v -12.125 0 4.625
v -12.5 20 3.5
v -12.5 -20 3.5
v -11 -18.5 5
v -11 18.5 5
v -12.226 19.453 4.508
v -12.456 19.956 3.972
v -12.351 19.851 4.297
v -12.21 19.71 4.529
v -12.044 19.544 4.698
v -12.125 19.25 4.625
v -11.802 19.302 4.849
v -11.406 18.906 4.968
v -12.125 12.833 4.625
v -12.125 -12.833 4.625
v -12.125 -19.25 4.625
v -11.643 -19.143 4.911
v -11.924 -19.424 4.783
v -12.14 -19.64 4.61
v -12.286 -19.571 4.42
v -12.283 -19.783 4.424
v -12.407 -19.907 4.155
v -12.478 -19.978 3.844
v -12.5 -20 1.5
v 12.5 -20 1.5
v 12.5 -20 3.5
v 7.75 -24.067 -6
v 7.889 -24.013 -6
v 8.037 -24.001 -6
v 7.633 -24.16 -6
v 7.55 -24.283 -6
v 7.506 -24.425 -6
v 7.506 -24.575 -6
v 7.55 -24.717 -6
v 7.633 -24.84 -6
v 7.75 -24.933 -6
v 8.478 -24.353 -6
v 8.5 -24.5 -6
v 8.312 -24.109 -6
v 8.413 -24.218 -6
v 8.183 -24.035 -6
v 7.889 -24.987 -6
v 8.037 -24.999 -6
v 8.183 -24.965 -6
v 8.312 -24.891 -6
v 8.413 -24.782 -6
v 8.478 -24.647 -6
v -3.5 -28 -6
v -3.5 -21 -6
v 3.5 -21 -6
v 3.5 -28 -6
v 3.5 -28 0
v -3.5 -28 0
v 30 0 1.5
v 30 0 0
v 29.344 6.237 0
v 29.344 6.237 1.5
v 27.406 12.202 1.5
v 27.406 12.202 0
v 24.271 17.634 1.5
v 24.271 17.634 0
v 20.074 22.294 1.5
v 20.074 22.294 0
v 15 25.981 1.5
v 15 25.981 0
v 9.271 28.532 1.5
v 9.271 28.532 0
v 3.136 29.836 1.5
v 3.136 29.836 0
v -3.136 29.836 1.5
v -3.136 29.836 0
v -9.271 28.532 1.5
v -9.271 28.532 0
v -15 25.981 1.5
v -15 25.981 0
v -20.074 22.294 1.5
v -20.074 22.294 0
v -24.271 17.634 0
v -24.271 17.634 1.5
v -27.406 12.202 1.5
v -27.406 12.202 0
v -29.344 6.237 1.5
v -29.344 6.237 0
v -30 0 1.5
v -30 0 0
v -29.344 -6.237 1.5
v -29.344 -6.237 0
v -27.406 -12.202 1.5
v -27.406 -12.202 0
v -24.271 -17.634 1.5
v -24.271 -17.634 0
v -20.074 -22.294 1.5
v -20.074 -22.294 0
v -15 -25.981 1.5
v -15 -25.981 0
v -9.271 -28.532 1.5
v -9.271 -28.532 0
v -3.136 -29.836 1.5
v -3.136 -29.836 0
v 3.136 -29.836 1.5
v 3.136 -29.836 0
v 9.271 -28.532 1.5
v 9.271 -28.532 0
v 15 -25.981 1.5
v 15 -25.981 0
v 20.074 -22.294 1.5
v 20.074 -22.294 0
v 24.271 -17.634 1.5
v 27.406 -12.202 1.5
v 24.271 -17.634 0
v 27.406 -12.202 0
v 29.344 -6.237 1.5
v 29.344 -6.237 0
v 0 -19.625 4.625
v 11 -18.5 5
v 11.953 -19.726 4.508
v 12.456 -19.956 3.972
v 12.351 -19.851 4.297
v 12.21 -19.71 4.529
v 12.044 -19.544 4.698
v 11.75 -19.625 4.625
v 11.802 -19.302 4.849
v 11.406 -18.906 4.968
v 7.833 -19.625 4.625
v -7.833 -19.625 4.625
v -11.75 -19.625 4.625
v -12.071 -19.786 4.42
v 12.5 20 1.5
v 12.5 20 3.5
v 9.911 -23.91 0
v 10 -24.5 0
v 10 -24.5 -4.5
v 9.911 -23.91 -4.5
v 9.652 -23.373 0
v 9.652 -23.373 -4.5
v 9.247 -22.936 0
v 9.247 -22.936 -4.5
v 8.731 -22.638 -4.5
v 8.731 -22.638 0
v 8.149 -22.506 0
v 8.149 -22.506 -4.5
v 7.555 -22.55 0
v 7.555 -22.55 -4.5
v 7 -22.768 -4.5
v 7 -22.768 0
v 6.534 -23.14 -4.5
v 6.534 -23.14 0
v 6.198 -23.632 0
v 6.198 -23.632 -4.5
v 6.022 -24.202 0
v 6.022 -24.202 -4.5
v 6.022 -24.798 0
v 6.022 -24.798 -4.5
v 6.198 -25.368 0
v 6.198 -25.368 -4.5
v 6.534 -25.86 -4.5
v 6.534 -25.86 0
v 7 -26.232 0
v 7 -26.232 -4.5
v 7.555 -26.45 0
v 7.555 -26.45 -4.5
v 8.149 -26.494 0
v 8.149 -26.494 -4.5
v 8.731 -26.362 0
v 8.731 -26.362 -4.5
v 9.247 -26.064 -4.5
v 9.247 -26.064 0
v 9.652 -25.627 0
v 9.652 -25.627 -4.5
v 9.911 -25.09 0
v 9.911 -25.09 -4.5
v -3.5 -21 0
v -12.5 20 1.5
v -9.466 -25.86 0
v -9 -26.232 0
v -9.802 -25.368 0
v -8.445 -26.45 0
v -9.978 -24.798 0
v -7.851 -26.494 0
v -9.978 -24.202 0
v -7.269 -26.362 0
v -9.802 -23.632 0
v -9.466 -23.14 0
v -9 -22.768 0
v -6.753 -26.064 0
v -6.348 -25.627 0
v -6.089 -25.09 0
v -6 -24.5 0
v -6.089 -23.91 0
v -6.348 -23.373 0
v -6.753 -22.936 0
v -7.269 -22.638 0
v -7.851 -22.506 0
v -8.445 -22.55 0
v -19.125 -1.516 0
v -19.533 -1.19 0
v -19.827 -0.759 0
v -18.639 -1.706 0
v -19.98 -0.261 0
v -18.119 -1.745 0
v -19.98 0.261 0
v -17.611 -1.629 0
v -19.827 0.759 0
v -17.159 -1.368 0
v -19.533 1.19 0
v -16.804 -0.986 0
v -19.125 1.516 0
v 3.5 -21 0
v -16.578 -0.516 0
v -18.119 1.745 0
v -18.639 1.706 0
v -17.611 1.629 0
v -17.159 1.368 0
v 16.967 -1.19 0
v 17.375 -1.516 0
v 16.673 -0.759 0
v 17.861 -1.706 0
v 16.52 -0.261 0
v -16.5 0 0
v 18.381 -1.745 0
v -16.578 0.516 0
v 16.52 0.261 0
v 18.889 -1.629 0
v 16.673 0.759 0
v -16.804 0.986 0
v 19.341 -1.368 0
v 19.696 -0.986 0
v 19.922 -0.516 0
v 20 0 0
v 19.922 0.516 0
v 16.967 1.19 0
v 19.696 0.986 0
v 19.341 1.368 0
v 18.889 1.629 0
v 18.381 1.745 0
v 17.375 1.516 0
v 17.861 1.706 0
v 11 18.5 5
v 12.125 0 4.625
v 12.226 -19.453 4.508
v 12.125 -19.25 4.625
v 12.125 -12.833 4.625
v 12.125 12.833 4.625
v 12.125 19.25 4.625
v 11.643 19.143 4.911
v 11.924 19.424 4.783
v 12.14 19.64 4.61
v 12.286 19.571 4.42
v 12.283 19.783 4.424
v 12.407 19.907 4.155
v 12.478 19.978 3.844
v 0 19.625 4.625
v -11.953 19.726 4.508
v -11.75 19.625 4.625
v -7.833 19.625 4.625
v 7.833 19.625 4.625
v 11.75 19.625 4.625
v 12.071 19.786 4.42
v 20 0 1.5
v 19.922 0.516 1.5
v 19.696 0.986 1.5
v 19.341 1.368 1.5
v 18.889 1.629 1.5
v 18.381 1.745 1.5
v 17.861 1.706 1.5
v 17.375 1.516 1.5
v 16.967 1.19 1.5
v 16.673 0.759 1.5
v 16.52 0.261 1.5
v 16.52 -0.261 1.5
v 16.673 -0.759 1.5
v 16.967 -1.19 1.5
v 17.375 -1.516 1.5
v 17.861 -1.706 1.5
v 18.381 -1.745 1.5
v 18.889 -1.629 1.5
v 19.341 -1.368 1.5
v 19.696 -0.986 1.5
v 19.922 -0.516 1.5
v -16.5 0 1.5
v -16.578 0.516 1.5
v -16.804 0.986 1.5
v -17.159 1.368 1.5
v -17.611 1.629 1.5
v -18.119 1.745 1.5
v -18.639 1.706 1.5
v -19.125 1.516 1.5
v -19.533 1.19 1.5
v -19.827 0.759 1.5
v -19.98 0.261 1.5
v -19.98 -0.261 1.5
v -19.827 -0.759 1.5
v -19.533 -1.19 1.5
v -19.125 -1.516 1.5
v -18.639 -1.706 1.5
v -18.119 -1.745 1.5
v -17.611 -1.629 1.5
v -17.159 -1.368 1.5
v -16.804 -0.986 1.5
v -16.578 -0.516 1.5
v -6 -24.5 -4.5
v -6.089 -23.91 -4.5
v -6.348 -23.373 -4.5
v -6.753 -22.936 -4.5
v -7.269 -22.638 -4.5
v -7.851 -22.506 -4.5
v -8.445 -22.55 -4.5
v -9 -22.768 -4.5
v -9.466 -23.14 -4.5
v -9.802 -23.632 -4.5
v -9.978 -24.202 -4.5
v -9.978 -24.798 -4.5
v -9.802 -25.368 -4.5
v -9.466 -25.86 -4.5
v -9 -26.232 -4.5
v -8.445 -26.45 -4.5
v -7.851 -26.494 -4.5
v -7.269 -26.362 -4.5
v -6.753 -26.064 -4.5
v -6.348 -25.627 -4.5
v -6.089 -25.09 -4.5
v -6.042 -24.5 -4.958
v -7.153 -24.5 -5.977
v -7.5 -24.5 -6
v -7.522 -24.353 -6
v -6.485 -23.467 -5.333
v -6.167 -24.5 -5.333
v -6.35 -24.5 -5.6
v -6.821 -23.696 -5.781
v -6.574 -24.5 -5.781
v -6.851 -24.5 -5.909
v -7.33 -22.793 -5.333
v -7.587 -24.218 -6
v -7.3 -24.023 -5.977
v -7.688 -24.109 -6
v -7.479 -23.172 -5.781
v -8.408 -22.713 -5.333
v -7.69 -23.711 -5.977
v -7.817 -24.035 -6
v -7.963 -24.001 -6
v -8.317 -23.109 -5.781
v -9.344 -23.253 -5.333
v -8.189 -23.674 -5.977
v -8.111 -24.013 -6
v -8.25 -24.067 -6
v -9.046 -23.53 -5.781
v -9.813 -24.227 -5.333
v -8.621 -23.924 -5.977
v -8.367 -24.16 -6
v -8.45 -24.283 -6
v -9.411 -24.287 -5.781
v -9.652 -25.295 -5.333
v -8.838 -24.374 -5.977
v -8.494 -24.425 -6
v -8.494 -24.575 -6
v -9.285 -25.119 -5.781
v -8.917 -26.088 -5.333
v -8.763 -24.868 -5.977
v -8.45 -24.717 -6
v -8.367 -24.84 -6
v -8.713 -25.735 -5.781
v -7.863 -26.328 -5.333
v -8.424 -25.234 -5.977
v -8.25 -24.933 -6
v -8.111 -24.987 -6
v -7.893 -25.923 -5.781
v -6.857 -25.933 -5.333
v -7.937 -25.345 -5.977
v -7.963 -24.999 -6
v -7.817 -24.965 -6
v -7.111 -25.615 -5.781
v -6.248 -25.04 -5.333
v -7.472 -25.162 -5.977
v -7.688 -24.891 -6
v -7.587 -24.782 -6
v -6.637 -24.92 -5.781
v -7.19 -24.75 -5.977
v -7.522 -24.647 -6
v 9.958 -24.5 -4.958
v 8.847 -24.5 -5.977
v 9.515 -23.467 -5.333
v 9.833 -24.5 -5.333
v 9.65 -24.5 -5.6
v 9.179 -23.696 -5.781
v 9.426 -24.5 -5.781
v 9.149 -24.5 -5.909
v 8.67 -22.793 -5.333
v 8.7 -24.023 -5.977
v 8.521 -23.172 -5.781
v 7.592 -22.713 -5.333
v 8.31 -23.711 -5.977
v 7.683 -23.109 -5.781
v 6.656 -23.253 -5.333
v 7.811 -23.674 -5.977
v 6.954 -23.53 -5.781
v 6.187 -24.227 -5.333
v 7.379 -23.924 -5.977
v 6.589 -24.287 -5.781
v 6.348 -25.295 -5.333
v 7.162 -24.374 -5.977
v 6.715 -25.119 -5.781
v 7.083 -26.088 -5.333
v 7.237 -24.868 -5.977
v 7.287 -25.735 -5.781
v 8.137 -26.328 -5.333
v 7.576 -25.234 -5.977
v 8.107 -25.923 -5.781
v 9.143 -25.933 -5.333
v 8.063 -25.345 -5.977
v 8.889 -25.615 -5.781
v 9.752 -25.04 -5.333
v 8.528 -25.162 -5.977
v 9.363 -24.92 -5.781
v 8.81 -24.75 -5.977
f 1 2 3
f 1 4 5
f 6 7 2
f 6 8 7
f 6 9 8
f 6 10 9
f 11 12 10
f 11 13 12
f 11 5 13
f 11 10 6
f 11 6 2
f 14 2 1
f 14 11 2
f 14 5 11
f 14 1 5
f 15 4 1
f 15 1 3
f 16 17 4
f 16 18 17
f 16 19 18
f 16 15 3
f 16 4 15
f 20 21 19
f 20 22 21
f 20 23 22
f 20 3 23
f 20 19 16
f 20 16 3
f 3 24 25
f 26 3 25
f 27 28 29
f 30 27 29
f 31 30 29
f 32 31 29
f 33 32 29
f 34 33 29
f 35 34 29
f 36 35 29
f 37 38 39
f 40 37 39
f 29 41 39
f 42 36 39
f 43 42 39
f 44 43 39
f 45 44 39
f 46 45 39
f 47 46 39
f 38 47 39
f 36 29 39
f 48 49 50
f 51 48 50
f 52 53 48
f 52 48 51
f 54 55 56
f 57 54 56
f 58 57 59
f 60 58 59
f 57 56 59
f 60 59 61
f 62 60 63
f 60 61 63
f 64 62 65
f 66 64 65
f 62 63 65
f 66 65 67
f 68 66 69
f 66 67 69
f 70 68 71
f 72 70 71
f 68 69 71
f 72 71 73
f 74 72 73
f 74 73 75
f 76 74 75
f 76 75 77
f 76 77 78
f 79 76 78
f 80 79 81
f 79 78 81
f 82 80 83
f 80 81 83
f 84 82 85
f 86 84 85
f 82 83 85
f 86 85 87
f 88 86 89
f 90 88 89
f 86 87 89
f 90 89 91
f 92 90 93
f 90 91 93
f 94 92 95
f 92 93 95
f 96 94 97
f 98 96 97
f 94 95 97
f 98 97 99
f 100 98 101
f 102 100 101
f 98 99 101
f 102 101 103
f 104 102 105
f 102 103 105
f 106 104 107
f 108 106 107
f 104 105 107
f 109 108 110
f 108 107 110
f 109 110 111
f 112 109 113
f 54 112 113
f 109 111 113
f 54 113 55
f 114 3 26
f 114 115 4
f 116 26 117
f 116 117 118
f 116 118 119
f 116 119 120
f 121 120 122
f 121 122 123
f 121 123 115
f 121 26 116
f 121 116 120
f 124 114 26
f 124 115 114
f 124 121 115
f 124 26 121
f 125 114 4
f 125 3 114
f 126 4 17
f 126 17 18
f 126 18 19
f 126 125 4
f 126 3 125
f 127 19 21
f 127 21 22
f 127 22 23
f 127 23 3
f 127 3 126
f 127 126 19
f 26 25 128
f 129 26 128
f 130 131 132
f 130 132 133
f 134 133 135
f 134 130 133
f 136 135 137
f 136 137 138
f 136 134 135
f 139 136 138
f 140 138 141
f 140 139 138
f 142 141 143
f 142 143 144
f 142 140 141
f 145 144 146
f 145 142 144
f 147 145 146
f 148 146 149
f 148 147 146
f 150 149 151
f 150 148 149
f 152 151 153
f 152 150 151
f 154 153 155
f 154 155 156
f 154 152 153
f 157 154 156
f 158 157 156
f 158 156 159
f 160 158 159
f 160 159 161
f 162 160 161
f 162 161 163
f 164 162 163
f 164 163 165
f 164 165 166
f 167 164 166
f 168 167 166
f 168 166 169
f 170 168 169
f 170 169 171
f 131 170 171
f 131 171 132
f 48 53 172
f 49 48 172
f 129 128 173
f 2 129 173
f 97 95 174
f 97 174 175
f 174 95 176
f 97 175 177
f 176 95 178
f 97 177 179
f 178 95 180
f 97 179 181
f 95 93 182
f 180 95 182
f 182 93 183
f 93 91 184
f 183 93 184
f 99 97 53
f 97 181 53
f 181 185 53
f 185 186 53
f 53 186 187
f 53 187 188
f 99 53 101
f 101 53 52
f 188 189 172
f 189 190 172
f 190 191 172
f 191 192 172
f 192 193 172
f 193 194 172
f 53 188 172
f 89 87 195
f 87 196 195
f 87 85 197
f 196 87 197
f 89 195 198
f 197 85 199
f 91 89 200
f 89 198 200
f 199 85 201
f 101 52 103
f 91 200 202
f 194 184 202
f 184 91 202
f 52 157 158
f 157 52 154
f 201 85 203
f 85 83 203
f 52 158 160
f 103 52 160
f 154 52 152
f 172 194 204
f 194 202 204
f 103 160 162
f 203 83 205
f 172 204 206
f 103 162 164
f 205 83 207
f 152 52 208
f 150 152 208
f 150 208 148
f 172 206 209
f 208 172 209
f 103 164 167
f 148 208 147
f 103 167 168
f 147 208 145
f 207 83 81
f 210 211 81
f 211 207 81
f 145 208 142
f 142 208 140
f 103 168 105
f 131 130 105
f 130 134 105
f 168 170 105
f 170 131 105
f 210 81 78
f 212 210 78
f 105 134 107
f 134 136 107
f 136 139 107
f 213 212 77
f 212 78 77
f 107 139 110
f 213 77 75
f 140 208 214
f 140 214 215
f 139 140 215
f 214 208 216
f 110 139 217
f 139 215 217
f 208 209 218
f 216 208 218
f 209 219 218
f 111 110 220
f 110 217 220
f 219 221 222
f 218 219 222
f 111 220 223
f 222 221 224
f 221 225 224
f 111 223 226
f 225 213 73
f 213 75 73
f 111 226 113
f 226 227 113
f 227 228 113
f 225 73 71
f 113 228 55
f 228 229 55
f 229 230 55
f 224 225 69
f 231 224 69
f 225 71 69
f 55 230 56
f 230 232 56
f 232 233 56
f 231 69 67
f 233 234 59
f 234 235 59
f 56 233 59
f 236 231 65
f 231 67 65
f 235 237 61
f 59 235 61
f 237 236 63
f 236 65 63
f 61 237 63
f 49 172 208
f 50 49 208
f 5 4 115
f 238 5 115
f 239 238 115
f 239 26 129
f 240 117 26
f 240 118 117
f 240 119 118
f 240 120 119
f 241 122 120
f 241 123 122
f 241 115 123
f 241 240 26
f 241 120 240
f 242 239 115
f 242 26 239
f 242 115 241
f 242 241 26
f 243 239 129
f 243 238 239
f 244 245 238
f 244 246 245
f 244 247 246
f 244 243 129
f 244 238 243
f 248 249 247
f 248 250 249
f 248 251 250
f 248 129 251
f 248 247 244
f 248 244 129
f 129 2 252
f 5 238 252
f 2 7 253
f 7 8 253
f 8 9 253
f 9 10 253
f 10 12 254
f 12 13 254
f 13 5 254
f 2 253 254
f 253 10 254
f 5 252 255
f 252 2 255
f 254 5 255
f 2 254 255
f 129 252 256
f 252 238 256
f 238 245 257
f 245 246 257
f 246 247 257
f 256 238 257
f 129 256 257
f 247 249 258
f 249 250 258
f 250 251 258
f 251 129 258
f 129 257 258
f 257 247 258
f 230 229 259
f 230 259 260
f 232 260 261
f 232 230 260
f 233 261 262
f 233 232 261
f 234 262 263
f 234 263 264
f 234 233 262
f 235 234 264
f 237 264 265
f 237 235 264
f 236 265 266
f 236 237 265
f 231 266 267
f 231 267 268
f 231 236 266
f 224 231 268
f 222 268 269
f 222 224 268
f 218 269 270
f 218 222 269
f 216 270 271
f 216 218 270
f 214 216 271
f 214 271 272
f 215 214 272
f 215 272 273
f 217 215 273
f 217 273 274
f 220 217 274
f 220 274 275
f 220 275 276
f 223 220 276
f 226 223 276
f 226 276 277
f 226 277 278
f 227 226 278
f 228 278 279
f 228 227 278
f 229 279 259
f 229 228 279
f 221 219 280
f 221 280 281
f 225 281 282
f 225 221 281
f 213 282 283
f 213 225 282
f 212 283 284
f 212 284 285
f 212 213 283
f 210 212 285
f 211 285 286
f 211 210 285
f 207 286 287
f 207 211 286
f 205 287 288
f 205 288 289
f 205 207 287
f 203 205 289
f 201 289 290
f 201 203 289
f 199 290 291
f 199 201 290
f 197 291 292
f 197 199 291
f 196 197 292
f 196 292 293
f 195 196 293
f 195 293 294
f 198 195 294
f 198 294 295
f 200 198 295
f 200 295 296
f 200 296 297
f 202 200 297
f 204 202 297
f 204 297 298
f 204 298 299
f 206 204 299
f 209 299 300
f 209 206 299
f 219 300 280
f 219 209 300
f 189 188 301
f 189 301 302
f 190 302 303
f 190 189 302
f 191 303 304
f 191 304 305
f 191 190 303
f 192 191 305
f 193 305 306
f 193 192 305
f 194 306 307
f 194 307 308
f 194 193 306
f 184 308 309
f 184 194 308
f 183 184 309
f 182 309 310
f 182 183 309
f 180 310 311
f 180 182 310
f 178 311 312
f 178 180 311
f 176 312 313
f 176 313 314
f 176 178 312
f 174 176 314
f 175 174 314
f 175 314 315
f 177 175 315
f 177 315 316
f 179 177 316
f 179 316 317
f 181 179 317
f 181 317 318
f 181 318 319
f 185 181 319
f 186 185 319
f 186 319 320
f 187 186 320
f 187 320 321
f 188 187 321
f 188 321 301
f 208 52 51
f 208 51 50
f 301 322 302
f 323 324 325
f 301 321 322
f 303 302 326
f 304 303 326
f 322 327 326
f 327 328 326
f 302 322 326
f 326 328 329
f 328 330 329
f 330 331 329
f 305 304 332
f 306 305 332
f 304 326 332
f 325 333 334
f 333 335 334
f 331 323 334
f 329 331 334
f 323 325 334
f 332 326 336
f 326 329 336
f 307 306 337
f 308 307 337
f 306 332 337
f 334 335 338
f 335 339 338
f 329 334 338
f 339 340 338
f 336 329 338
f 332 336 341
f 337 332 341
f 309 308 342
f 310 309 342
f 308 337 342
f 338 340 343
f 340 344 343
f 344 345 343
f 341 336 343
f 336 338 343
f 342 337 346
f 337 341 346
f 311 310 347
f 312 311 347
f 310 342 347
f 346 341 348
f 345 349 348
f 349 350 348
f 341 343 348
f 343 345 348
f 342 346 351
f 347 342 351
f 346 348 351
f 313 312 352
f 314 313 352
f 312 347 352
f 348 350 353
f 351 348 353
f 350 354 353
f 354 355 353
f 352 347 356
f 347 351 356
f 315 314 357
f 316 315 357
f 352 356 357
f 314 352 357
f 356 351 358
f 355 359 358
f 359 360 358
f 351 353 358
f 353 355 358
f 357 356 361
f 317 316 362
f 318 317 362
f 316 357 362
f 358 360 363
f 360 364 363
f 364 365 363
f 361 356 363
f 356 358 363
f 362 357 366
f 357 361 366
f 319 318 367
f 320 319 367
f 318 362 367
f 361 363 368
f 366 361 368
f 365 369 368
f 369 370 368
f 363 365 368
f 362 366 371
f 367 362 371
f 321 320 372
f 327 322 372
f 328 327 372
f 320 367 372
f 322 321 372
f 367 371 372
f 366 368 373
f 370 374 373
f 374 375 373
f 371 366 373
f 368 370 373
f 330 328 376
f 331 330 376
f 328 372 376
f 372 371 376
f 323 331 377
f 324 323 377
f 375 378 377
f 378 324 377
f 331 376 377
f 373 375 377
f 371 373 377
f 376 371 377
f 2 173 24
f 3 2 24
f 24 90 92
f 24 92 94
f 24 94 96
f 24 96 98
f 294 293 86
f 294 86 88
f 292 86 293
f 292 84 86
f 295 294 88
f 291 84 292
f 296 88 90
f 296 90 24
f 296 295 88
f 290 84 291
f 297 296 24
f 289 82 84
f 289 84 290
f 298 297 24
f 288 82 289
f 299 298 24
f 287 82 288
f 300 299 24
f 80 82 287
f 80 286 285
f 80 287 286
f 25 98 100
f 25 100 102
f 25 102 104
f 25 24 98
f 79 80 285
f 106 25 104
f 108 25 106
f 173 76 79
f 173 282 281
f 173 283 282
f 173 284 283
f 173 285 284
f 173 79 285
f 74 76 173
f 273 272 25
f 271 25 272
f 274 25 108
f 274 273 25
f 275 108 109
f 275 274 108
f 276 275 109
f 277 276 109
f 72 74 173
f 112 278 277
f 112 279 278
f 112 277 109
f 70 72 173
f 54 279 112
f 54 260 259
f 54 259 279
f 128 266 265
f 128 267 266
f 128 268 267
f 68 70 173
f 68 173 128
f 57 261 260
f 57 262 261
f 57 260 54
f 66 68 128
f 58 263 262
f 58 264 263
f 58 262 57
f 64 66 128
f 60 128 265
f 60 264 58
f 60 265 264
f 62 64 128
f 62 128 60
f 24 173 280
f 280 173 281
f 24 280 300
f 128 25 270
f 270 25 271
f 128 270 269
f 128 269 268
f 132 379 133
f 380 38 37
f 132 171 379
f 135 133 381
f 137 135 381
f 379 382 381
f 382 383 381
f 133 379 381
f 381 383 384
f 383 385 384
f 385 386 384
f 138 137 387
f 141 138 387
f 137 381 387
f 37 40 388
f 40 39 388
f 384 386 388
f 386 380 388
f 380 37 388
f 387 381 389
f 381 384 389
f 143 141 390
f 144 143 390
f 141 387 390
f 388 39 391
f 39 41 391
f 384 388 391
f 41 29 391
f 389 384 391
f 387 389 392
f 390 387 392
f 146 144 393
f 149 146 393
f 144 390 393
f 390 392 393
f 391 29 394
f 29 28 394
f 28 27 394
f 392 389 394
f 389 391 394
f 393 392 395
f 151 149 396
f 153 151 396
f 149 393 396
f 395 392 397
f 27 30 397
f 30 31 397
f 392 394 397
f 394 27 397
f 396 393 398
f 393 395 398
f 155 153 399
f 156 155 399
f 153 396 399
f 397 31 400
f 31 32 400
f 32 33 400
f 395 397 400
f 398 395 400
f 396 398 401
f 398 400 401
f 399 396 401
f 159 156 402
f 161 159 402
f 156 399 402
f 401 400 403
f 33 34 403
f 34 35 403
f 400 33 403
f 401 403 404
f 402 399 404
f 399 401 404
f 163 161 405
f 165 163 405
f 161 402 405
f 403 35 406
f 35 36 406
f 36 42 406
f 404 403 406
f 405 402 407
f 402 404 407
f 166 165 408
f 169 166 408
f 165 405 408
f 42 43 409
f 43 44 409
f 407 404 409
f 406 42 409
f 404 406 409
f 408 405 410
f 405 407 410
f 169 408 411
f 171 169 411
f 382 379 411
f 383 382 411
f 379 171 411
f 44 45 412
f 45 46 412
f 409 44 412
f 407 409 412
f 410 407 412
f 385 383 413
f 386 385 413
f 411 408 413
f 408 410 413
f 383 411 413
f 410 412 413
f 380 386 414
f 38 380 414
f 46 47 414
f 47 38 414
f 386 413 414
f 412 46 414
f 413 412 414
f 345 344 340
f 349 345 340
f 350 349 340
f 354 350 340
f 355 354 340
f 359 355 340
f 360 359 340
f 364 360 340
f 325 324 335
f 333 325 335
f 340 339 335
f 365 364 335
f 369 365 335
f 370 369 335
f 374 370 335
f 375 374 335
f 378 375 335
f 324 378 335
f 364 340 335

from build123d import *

# Parameters (mm, degrees)
SKETCH_1_R      = 30
SKETCH_1_R_2    = 1.75
SKETCH_1_W      = 25
SKETCH_1_H      = 40
EXTRUDE_6_DEPTH = 1.5
EXTRUDE_7_DEPTH = 5
SKETCH_1_10_R   = 2
SKETCH_1_10_W   = 7
SKETCH_1_10_H   = 7
EXTRUDE_8_DEPTH = 6
FILLET_3_SIZE   = 1.5
FILLET_4_SIZE   = 1.5
EXTRUDE_9_DEPTH = 5
FILLET_5_SIZE   = 1.5


with BuildPart() as part:
    # 草图1 → 凸台-拉伸6 (new body)
    with BuildSketch(Plane.XY):
        Circle(SKETCH_1_R)
        with Locations((18.25, 0)):
            Circle(SKETCH_1_R_2, mode=Mode.SUBTRACT)
        with Locations((-18.25, 0)):
            Circle(SKETCH_1_R_2, mode=Mode.SUBTRACT)
        Rectangle(SKETCH_1_W, SKETCH_1_H, mode=Mode.SUBTRACT)
    extrude(amount=EXTRUDE_6_DEPTH)

    # 草图1<9> → 凸台-拉伸7 (add)
    with BuildSketch(Plane.XY):
        Polygon((-12.5, 20), (-12.5, 0), (0, 0), (12.5, 0), (12.5, 20), align=None)
    extrude(amount=EXTRUDE_7_DEPTH)

    # 草图1<10> → 凸台-拉伸8 (add)
    with BuildSketch(Plane.XY):
        with Locations((8, -24.5)):
            Circle(SKETCH_1_10_R)
        with Locations((0, -24.5)):
            Rectangle(SKETCH_1_10_W, SKETCH_1_10_H)
        with Locations((-8, -24.5)):
            Circle(SKETCH_1_10_R)
    extrude(amount=-EXTRUDE_8_DEPTH)

    # 圆角3
    # a fillet whose section is not a circle: 1.5 mm, written as the material it takes off along each edge
    with BuildSketch(Plane(origin=(8, -24.5, -6), x_dir=(1, 0, 0), z_dir=(0, -1, 0))) as fillet_3_piece_1:
        with BuildLine():
            Bezier((2, FILLET_3_SIZE), (2, 0), (2 - FILLET_3_SIZE, 0), weights=[1, 1, 1])
            Line((2 - FILLET_3_SIZE, 0), (2, 0))
            Line((2, 0), (2, FILLET_3_SIZE))
        make_face()
    revolve(axis=Axis((8, -24.5, -6), (0, 0, 1)), mode=Mode.SUBTRACT)

    # 圆角4
    # a fillet whose section is not a circle: 1.5 mm, written as the material it takes off along each edge
    with BuildSketch(Plane(origin=(-8, -24.5, -6), x_dir=(1, 0, 0), z_dir=(0, -1, 0))) as fillet_4_piece_1:
        with BuildLine():
            Bezier((2, FILLET_4_SIZE), (2, 0), (2 - FILLET_4_SIZE, 0), weights=[1, 1, 1])
            Line((2 - FILLET_4_SIZE, 0), (2, 0))
            Line((2, 0), (2, FILLET_4_SIZE))
        make_face()
    revolve(axis=Axis((-8, -24.5, -6), (0, 0, 1)), mode=Mode.SUBTRACT)

    # 草图1<11> → 凸台-拉伸9 (add)
    with BuildSketch(Plane.XY):
        Polygon((-12.5, 0), (-12.5, -20), (12.5, -20), (12.5, 0), (0, 0), align=None)
    extrude(amount=EXTRUDE_9_DEPTH)

    # 圆角5
    # a fillet whose section is not a circle: 1.5 mm, written as the material it takes off along each edge
    with BuildSketch(Plane(origin=(16.25, 20, 5), x_dir=(0, -1, 0), z_dir=(-1, 0, 0))) as fillet_5_piece_1:
        with BuildLine():
            Bezier((FILLET_5_SIZE, 0), (0, 0), (0, -FILLET_5_SIZE), weights=[1, 1, 1])
            Line((0, -FILLET_5_SIZE), (0, 0))
            Line((0, 0), (FILLET_5_SIZE, 0))
        make_face()
    extrude(amount=32.5, mode=Mode.SUBTRACT)
    with BuildSketch(Plane(origin=(12.5, 23.75, 5), x_dir=(-1, 0, 0), z_dir=(0, -1, 0)), Plane(origin=(-12.5, -23.75, 5), x_dir=(1, 0, 0), z_dir=(0, 1, 0))) as fillet_5_piece_2:
        with BuildLine():
            Bezier((FILLET_5_SIZE, 0), (0, 0), (0, FILLET_5_SIZE), weights=[1, 1, 1])
            Line((0, FILLET_5_SIZE), (0, 0))
            Line((0, 0), (FILLET_5_SIZE, 0))
        make_face()
    extrude(amount=47.5, mode=Mode.SUBTRACT)
    with BuildSketch(Plane(origin=(-16.25, -20, 5), x_dir=(0, 0, -1), z_dir=(1, 0, 0))) as fillet_5_piece_3:
        with BuildLine():
            Bezier((FILLET_5_SIZE, 0), (0, 0), (0, FILLET_5_SIZE), weights=[1, 1, 1])
            Line((0, FILLET_5_SIZE), (0, 0))
            Line((0, 0), (FILLET_5_SIZE, 0))
        make_face()
    extrude(amount=32.5, mode=Mode.SUBTRACT)


solid = part.part
